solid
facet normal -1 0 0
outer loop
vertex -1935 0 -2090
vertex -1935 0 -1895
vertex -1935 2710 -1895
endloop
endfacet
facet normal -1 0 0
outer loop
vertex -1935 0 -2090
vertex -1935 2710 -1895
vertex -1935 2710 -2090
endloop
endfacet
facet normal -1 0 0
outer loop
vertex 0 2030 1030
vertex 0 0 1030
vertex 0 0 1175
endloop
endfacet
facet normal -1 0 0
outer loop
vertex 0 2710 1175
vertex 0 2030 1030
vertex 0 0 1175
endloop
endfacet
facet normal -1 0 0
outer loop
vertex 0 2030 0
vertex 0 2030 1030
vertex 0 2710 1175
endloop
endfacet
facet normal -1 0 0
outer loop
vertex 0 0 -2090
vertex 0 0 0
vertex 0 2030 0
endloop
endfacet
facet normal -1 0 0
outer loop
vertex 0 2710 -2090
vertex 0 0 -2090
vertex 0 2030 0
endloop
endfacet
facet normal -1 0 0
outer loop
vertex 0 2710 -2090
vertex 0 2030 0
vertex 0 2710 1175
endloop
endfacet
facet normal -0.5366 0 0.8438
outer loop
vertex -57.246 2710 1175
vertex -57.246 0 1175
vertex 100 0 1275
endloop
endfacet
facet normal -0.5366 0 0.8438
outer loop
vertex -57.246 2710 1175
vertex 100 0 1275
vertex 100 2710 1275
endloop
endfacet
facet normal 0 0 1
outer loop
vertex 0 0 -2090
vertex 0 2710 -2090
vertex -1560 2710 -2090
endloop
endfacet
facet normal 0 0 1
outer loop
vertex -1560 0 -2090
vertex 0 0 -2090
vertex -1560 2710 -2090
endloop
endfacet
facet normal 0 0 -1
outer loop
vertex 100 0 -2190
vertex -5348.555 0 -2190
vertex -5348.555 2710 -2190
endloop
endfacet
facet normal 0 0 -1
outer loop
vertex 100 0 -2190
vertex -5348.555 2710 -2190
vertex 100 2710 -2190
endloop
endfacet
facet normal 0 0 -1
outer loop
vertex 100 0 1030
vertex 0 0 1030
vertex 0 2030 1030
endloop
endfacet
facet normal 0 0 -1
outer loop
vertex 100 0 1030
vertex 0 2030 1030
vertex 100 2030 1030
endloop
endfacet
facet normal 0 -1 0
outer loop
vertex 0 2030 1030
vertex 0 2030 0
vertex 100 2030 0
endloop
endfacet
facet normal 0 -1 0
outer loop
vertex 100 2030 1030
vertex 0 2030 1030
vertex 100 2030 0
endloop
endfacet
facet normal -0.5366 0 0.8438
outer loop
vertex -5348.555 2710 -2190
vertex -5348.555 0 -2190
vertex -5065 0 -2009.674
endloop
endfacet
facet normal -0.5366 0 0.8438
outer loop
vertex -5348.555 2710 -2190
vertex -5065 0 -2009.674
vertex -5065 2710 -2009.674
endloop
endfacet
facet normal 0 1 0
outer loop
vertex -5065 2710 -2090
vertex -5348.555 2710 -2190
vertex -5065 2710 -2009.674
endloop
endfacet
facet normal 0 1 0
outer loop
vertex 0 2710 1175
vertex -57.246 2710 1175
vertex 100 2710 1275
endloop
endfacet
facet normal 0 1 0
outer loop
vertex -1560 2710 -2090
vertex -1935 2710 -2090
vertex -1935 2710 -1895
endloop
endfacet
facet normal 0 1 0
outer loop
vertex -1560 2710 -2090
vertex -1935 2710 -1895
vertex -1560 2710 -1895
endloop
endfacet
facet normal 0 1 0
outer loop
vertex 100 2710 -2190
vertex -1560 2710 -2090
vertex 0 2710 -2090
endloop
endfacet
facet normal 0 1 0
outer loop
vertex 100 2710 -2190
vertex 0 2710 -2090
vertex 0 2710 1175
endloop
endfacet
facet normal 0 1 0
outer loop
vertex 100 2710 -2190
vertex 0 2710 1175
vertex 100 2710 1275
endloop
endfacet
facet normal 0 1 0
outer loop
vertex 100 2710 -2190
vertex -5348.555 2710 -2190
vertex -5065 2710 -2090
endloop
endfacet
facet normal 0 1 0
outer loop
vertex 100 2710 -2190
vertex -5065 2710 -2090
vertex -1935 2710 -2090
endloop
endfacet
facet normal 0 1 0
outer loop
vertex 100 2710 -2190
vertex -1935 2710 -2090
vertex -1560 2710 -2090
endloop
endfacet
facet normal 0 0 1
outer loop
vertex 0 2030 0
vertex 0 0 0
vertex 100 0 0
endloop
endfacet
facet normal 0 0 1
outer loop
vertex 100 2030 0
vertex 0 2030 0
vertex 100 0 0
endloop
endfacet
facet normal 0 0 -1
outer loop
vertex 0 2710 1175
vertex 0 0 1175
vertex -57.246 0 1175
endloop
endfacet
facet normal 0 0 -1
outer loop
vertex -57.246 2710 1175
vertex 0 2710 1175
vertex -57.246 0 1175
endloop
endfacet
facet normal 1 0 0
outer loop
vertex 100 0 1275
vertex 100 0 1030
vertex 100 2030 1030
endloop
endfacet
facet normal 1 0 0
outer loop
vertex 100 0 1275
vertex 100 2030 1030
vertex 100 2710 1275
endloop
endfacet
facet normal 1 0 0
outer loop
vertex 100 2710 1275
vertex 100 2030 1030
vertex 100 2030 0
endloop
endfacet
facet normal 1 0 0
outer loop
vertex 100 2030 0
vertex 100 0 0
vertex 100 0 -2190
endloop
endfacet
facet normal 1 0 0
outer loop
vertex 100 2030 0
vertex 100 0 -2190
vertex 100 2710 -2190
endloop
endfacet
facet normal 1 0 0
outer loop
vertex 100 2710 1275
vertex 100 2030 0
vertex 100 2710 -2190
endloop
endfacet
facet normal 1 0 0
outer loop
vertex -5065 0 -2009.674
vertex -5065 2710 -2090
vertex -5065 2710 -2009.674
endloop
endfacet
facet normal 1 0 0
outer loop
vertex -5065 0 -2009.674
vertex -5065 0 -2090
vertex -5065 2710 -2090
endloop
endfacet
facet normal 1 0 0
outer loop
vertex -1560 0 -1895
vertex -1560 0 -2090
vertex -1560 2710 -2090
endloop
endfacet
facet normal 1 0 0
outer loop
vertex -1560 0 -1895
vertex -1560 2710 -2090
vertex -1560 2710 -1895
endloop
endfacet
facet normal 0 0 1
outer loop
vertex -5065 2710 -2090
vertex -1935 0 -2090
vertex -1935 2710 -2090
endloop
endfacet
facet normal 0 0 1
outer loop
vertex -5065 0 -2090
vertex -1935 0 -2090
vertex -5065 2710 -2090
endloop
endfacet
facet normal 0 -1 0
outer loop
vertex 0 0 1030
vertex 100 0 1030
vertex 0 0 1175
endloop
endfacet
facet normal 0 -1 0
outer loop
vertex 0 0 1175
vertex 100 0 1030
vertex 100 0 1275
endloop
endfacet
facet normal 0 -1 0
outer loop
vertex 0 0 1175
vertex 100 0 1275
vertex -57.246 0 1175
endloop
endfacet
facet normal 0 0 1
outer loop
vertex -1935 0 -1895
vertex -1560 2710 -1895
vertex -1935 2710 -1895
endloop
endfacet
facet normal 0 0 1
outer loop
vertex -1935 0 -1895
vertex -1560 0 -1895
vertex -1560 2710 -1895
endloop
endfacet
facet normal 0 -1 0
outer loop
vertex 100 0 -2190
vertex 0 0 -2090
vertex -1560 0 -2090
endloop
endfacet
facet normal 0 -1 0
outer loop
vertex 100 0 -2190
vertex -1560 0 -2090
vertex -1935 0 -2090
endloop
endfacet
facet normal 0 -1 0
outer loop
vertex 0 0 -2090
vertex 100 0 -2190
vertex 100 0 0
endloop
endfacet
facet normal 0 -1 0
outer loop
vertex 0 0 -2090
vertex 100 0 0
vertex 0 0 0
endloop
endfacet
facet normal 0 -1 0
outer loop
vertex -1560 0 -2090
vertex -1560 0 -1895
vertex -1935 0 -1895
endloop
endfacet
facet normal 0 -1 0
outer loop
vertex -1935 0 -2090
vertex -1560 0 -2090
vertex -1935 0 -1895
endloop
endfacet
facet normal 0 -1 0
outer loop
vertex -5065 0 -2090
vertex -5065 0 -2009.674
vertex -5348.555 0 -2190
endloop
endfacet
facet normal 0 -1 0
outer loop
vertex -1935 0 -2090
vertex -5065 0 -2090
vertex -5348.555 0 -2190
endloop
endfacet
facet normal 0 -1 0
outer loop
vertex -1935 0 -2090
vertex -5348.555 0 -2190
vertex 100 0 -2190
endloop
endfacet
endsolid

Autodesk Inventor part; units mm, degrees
ref_plane "YZ Plane" through (0, 0, 0) normal (1, 0, 0) x (0, 1, 0)
ref_plane "XZ Plane" through (0, 0, 0) normal (0, 1, 0) x (-1, 0, 0)
ref_plane "XY Plane" through (0, 0, 0) normal (0, 0, 1) x (1, 0, 0)
sketch "Boceto1" plane through (0, 0, 0) normal (0, 1, 0) x (-1, 0, 0)
  line L0 (0, 0) -> (0, -2090)
  line L1 (0, -2090) -> (1560, -2090)
  line L2 (1560, -2090) -> (1560, -1895)
  line L3 (1560, -1895) -> (1935, -1895)
  line L4 (1935, -1895) -> (1935, -2090)
  line L5 (1935, -2090) -> (5065, -2090)
  line L6 (5065, -2090) -> (5065, -1915)
  line L7 (5065, -1915) -> (5250, -1915)
  line L8 (0, 0) -> (0, 310) construction
  line L9 (0, 310) -> (0, 1030) construction
  line L10 (0, 1030) -> (0, 1175)
  line L11 (0, 1175) -> (1645, 1175)
  line L12 (1645, 1175) -> (1645, 1535)
  line L13 (1645, 1535) -> (2010, 1535)
  line L14 (2010, 1535) -> (2010, 1825)
  line L15 (2010, 1825) -> (5120, 1825)
  line L16 (5120, 1825) -> (5120, 1520)
  line L17 (5120, 1520) -> (5300, 1520)
  line L18 (5300, 1520) -> (5250, -1915)
  line L19 (-100, -2190) -> (-100, 0)
  line L20 (-100, 0) -> (-100, 310)
  line L21 (-100, 310) -> (-100, 1030)
  line L22 (-100, 1030) -> (-100, 1275)
  line L23 (-100, 1275) -> (1545, 1275)
  line L24 (1545, 1275) -> (1545, 1635)
  line L25 (1545, 1635) -> (1910, 1635)
  line L26 (1910, 1635) -> (1910, 1925)
  line L27 (1910, 1925) -> (5220, 1925)
  line L28 (5220, 1925) -> (5220, 1620)
  line L29 (5220, 1620) -> (5401.4662, 1620)
  line L30 (5401.4662, 1620) -> (5348.555, -2015)
  line L31 (5348.555, -2015) -> (5165, -2015)
  line L32 (5165, -2015) -> (5165, -2190)
  line L33 (5165, -2190) -> (1835, -2190)
  line L34 (1835, -2190) -> (1835, -1995)
  line L35 (1835, -1995) -> (1660, -1995)
  line L36 (1660, -1995) -> (1660, -2190)
  line L37 (1660, -2190) -> (-100, -2190)
  line L38 (0, 1030) -> (-100, 1030)
  line L39 (0, 0) -> (-100, 0)
  line L40 (1835, -2190) -> (1660, -2190)
  line L41 (5348.555, -2015) -> (5348.555, -2190)
  line L42 (5348.555, -2190) -> (5165, -2190)
  line L43 (5220, 1925) -> (5401.4662, 1925)
  line L44 (5401.4662, 1925) -> (5401.4662, 1620)
  line L45 (1545, 1635) -> (1545, 1925)
  line L46 (1545, 1925) -> (1910, 1925)
  dimension "d0" = 2090
  dimension "d1" = 1560
  dimension "d2" = 195
  dimension "d3" = 375
  dimension "d4" = 195
  dimension "d5" = 3130
  dimension "d6" = 175
  dimension "d8" = 185
  dimension "d10" = 310
  dimension "d11" = 720
  dimension "d12" = 145
  dimension "d13" = 1645
  dimension "d14" = 360
  dimension "d15" = 365
  dimension "d16" = 290
  dimension "d17" = 3110
  dimension "d18" = 305
  dimension "d19" = 180
  dimension "d20" = 100
extrude "Extrusión1" add sketch "Boceto1" along normal blind 2710 contours L0 L1 L2 L3 L4 L5 L6 L7 L18 L17 L16 L15 L14 L13 L12 L11 L10 L38 L22 L23 L24 L25 L26 L27 L28 L29 L30 L31 L32 L33 L34 L35 L36 L37 L19 L39 | L36 L35 L34 L40 | L32 L31 L41 L42 | L45 L46 L26 L25 | L29 L28 L43 L44
sketch "Boceto2" plane through (0, 0, 0) normal (0, 0, 1) x (1, 0, 0)
  line L0 (0, 0) -> (0, 2030)
  line L1 (0, 0) -> (0, 2710) projected
  line L2 (0, 2030) -> (100, 2030)
  line L3 (100, 0) -> (100, 2710) projected
  line L4 (0, 0) -> (100, 0) projected
  line L5 (100, 0) -> (100, 2710) projected
  line L6 (0, 2710) -> (100, 2710) projected
  line L7 (0, 0) -> (0, 2710) projected
  dimension "d23" = 2030
extrude "Extrusión2" add sketch "Boceto2" along normal up to surface (1030 mm away) contours L1 L6 L3 L2
sketch "Boceto3" plane through (-5250, 0, -1915) normal (0.9998941, 0, 0.0145545) x (0.0145545, 0, -0.9998941)
  line L0 (-3435.3639, 0) -> (0, 0) projected
  line L1 (0, 0) -> (0, 2710) projected
  line L2 (-3435.3639, 2710) -> (0, 2710) projected
  line L3 (-3435.3639, 0) -> (-3435.3639, 2710) projected
  line L4 (-3435.3639, 0) -> (0, 0) projected
  line L5 (0, 0) -> (-280, 0)
  line L6 (-280, 0) -> (-280, 1120)
  line L7 (-280, 1120) -> (-2610, 1120)
  line L8 (-2610, 1120) -> (-2610, 2470)
  line L9 (-2610, 2470) -> (-280, 2470)
  line L10 (-280, 2470) -> (-280, 1120)
  point P0 (-1838.386, 0)
  dimension "d26" = 280
  dimension "d27" = 1120
  dimension "d28" = 2330
  dimension "d29" = 1350
extrude "Extrusión3" cut sketch "Boceto3" against normal up to surface (100 mm away) contours L7 L8 L9 L10
ref_plane "Plano division pared" through (-5348.555, 2710, -2190) normal (0.5366261, 0, -0.8438201) x (0.8438201, 0, 0.5366261)
split "Dividir1" plane through (-5348.555, 2710, -2190) removes the side toward (-0.5366261, 0, 0.8438201)
properties part number "Paredes"
